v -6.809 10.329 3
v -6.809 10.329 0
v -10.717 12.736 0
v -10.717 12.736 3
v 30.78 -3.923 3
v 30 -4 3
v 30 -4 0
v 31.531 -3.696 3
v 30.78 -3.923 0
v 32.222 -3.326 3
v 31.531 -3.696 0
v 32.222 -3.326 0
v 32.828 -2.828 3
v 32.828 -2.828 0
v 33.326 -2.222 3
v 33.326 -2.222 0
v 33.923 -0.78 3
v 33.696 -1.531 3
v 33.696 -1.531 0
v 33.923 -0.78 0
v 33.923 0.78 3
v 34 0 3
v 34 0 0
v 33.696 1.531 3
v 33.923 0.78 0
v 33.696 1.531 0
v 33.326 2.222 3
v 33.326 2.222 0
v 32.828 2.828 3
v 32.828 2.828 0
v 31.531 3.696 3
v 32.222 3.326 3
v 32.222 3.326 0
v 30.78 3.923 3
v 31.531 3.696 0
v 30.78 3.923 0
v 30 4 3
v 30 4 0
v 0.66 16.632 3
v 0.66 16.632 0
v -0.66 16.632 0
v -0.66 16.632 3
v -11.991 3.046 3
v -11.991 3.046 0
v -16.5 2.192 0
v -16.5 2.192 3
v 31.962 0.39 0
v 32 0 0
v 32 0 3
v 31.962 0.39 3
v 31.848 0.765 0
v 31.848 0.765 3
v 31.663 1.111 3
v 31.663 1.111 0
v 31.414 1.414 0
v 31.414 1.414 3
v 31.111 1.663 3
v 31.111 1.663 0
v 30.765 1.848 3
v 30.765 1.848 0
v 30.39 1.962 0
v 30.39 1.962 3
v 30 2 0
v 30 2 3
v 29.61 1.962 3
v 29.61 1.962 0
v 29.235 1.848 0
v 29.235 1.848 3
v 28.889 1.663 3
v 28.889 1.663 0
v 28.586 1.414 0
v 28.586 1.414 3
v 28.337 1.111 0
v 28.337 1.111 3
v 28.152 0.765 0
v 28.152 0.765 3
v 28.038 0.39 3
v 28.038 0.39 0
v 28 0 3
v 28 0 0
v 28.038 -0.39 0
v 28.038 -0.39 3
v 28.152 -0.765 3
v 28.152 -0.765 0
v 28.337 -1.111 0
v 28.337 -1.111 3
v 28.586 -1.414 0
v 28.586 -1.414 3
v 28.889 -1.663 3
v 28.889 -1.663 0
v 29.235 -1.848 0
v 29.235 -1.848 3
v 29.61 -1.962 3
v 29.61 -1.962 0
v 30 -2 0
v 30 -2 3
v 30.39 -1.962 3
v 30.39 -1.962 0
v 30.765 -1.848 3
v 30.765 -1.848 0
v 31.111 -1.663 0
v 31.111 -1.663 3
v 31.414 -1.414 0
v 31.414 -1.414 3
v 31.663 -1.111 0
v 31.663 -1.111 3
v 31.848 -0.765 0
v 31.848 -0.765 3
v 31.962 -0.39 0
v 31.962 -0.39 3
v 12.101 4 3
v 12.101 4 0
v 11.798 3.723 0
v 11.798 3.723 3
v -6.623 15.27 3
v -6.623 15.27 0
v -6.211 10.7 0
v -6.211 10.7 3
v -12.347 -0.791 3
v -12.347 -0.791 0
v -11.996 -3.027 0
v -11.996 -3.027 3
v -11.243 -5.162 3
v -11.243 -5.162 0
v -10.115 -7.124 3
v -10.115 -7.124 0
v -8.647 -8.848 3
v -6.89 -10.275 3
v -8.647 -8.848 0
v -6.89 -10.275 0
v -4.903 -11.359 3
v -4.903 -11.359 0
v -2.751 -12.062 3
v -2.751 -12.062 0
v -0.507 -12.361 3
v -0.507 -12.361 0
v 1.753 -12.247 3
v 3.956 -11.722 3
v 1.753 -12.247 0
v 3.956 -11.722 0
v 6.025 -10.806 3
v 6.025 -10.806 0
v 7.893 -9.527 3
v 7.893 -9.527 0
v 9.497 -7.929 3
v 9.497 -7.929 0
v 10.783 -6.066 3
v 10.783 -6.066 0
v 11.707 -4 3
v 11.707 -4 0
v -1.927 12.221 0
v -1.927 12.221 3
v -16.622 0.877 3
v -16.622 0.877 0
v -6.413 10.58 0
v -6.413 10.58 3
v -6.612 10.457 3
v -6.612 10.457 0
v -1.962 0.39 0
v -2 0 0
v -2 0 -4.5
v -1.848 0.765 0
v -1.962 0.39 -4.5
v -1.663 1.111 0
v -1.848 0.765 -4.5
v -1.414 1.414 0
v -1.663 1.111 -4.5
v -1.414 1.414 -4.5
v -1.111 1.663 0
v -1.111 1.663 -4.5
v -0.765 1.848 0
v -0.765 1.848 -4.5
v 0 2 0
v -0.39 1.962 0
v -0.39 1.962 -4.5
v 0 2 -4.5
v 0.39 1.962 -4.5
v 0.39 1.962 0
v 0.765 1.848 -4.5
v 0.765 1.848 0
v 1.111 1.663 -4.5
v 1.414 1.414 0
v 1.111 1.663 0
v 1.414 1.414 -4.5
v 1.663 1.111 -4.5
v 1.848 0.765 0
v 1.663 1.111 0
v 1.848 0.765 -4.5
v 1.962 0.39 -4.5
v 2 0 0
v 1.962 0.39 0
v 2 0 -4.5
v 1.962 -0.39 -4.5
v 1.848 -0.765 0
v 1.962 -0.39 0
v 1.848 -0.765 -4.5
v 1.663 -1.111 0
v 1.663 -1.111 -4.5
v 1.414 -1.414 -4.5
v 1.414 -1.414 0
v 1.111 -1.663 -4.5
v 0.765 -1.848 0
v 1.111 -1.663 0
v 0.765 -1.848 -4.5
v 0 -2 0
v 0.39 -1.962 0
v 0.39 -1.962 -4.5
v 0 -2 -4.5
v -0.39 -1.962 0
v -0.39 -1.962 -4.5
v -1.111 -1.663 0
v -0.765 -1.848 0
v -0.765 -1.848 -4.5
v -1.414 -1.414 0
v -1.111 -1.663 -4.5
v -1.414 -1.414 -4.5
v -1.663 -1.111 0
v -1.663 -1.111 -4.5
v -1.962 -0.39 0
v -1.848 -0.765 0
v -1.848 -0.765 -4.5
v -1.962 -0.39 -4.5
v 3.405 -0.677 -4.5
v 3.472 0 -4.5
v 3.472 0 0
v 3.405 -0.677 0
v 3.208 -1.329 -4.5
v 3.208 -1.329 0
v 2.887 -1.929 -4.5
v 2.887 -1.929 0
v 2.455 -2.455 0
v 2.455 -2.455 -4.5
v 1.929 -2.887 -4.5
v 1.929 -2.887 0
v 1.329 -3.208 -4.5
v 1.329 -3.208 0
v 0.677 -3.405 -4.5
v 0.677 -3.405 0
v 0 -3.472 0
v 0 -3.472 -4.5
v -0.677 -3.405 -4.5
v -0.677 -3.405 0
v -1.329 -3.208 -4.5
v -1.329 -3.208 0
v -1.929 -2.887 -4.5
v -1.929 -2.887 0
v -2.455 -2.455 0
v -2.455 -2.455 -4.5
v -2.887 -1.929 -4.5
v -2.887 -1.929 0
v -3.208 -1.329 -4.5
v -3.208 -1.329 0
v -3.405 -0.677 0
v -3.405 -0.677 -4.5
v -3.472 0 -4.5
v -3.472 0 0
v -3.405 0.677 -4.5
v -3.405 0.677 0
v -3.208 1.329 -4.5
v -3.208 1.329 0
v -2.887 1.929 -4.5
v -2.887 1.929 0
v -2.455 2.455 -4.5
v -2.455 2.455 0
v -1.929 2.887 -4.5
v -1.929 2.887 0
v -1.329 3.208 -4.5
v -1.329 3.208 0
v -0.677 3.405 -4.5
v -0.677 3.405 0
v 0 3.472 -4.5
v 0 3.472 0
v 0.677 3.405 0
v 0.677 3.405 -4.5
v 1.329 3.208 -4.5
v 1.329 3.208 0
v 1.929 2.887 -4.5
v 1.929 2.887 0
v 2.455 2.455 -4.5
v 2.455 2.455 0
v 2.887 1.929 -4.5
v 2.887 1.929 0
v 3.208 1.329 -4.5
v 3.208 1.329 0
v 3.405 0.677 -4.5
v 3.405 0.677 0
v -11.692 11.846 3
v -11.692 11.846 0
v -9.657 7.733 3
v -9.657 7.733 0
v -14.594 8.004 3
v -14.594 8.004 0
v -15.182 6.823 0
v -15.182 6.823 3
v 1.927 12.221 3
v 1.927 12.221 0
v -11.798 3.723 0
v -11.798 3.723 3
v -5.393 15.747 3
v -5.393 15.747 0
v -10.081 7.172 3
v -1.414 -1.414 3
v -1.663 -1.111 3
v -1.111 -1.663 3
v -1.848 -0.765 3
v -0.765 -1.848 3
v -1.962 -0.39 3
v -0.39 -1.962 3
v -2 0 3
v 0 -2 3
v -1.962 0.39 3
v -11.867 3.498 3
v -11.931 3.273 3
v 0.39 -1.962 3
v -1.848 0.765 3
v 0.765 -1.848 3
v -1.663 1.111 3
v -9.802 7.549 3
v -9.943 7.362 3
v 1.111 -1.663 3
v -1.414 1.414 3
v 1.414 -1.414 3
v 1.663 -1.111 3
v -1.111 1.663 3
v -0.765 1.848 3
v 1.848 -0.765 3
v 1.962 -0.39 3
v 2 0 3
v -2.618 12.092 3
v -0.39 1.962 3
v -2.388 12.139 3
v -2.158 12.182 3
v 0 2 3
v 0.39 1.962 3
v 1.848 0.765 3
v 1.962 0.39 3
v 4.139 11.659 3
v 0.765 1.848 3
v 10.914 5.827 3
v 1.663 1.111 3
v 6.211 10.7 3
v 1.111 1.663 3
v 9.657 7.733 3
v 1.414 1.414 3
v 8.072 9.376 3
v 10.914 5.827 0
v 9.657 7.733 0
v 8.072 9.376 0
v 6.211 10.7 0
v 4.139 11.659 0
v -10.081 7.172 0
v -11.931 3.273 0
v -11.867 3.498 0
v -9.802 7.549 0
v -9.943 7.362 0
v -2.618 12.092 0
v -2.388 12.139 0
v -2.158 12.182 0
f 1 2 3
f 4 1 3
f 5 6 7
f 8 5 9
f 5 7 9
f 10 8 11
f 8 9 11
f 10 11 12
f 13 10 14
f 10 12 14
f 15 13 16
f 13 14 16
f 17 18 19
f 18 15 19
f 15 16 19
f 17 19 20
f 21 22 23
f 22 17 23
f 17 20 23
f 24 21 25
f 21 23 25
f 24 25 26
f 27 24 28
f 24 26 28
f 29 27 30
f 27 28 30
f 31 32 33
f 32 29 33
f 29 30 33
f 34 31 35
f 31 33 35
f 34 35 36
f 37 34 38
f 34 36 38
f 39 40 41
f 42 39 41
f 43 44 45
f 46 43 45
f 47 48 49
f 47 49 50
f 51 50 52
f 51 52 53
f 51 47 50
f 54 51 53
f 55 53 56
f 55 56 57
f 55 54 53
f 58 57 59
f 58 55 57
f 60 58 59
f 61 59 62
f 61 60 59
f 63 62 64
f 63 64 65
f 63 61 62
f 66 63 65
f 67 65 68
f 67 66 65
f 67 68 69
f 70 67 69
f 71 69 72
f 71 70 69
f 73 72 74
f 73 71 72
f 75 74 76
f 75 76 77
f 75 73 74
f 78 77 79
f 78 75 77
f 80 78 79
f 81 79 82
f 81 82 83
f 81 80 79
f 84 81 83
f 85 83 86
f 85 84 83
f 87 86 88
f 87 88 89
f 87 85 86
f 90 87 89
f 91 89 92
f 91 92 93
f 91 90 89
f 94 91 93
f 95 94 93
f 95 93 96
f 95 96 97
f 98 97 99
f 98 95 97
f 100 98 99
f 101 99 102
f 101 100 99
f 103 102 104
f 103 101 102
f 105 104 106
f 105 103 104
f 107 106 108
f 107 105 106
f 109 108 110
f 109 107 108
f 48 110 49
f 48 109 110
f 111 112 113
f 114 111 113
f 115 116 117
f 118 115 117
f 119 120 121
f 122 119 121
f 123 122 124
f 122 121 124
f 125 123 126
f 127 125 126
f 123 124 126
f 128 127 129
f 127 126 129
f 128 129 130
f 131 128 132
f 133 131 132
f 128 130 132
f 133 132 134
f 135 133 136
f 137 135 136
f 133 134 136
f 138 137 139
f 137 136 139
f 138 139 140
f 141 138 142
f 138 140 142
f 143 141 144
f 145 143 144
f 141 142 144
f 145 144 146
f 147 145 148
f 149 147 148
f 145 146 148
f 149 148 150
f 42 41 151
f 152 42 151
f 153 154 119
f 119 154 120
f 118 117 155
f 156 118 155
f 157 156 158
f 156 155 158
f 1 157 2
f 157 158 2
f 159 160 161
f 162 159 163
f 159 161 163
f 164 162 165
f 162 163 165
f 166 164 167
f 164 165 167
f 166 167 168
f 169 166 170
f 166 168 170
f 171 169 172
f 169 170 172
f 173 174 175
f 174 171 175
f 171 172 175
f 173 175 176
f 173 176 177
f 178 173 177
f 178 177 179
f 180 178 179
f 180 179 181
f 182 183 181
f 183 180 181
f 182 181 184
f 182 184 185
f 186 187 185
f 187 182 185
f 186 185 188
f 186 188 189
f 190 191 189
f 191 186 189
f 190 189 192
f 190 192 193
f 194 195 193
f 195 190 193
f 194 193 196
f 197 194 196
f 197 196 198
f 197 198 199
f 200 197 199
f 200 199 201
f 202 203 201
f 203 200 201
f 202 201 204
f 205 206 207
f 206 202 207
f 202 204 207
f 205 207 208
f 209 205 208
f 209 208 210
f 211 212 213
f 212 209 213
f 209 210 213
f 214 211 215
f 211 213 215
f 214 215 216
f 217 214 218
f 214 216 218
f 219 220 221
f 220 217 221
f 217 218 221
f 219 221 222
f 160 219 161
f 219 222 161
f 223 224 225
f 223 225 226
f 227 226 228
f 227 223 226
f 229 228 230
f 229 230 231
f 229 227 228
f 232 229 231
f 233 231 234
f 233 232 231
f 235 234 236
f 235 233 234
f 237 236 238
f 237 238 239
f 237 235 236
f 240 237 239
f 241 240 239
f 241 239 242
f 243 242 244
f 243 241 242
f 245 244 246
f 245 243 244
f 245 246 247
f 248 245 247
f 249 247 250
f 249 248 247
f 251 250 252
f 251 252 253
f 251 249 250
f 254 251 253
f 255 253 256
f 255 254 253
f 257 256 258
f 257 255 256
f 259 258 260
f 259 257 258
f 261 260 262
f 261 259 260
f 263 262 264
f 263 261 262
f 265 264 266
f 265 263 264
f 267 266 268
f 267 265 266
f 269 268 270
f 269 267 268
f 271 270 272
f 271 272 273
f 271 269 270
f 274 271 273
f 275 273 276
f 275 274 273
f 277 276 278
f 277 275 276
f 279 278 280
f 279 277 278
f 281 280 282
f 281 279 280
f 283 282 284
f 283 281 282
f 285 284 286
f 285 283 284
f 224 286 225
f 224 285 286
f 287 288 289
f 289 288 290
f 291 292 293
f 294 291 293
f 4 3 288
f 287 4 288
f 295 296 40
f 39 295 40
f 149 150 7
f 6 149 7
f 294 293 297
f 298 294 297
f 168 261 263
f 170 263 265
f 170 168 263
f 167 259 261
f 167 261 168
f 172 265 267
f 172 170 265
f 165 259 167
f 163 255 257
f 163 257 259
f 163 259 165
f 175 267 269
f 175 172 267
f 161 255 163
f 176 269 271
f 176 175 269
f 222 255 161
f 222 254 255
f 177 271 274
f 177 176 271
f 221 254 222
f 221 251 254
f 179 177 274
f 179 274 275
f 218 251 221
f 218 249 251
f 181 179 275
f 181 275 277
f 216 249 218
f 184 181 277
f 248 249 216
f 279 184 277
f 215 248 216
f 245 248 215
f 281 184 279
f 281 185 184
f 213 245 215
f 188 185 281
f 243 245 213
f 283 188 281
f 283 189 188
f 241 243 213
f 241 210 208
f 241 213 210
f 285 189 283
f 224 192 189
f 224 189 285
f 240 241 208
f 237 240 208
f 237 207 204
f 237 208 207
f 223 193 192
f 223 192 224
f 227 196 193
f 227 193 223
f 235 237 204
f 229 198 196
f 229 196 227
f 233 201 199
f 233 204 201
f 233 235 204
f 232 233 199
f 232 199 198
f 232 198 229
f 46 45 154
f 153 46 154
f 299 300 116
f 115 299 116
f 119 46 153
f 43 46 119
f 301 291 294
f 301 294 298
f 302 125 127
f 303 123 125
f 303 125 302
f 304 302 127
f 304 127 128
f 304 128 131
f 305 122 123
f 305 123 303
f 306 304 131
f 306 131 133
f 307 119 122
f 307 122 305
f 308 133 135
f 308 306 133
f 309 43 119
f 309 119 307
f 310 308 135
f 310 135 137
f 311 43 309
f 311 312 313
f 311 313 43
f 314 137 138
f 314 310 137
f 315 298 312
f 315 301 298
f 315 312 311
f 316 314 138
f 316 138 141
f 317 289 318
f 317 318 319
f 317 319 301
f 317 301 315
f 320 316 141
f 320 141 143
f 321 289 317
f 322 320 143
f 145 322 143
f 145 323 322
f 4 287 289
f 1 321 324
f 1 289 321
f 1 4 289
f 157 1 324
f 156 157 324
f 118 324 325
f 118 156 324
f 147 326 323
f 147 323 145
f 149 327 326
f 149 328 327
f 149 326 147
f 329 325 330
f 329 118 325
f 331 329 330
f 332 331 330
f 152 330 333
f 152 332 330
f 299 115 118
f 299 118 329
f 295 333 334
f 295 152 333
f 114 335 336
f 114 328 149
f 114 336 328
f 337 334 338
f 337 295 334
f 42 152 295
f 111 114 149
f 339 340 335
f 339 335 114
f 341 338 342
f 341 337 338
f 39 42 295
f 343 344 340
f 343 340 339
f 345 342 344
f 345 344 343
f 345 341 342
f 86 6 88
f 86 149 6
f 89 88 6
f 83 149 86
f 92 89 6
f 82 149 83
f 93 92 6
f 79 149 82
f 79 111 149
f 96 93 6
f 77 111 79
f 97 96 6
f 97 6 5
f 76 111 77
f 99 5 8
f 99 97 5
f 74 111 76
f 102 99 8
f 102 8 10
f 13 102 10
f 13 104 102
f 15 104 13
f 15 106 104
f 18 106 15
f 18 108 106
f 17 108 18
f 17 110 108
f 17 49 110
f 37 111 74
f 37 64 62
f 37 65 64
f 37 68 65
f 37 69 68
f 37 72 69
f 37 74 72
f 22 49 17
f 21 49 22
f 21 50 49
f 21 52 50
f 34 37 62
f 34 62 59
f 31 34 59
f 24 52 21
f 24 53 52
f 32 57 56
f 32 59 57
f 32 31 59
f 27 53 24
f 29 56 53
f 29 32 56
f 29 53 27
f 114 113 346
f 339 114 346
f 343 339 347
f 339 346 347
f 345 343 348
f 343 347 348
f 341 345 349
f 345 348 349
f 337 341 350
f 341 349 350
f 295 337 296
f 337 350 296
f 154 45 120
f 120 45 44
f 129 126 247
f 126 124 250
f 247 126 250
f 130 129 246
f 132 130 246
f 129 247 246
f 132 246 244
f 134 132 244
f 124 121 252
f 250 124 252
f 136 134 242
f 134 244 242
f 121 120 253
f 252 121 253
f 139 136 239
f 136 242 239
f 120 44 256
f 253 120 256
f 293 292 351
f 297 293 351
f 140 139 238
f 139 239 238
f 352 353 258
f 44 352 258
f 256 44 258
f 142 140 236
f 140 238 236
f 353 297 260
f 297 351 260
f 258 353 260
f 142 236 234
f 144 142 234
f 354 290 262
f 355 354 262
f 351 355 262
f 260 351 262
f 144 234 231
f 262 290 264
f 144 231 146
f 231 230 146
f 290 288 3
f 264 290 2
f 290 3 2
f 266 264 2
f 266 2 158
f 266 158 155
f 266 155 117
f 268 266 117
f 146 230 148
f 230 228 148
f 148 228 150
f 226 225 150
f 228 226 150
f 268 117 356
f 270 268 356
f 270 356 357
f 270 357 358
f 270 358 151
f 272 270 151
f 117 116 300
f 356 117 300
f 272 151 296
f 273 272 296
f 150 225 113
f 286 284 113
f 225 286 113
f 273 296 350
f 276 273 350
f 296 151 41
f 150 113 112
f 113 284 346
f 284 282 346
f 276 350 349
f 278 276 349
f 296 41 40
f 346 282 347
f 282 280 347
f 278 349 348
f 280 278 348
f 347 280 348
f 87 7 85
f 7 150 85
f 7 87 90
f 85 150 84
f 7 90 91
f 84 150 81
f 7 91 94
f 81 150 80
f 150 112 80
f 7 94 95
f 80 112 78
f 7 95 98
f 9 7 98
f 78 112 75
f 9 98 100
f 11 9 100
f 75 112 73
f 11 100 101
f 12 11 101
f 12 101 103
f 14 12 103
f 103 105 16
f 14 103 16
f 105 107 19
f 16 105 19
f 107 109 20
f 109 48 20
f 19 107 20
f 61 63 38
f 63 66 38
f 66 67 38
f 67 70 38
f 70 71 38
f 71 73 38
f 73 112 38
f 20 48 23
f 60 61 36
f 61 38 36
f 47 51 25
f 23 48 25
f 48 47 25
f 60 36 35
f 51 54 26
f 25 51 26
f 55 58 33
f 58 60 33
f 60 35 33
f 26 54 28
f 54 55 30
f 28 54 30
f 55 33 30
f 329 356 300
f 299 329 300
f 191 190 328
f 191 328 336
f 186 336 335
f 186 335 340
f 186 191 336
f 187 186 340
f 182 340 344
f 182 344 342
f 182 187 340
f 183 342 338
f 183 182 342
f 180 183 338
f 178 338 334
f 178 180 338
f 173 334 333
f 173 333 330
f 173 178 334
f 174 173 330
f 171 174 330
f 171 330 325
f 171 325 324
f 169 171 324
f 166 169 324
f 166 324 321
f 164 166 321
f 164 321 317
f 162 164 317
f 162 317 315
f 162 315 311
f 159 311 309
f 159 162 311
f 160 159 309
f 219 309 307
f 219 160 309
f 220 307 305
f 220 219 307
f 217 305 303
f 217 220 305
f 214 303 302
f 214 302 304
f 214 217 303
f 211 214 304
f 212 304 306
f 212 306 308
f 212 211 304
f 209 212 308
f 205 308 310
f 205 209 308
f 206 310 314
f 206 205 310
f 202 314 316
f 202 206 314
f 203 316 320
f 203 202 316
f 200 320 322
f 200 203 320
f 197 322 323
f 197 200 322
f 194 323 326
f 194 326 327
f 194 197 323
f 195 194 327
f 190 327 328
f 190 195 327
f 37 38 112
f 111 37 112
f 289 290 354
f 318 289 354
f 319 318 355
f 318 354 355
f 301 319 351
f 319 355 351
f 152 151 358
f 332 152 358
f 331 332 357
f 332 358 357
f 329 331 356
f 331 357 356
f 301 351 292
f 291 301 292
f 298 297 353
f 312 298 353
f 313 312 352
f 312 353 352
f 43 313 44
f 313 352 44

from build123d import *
from build123d.topology import SkipClean

# Parameters (mm, degrees)
SKETCH_1_R      = 12.371827661
SKETCH_1_R_2    = 2
SKETCH_1_R_3    = 4
EXTRUDE_2_DEPTH = 3
EXTRUDE_START   = 4.5
SKETCH_2_R      = 3.472144909
SKETCH_2_R_2    = 2
EXTRUDE_5_DEPTH = 4.5


with BuildPart() as part:
    # ｽｹｯﾁ1 → ﾎﾞｽ - 押し出し2 (new body)
    # profile 1 of 10: a face of its own
    with BuildSketch(Plane.XY):
        with BuildLine():
            ThreePointArc((-12.346524216, -0.790859961), (-12.319051626, 1.141528242), (-11.990981042, 3.046061939))
            Line((-11.990981042, 3.046061939), (-16.499913731, 2.191691895))
            Line((-16.499913731, 2.191691895), (-16.621693674, 0.877477017))
            Line((-16.621693674, 0.877477017), (-12.346524216, -0.790859961))
        make_face()
    # profile 2 of 10: a face of its own
    with BuildSketch(Plane.XY):
        with BuildLine():
            ThreePointArc((-11.798482531, 3.722624028), (-11.074805969, 5.51459812), (-10.080892335, 7.172010138))
            Line((-10.080892335, 7.172010138), (-14.59398091, 8.004148156))
            Line((-14.59398091, 8.004148156), (-15.182286497, 6.822671267))
            Line((-15.182286497, 6.822671267), (-11.798482531, 3.722624028))
        make_face()
    # profile 3 of 10: a face of its own
    with BuildSketch(Plane.XY):
        with BuildLine():
            ThreePointArc((-9.656990403, 7.733347015), (-8.334846399, 9.142890964), (-6.809323258, 10.329338626))
            Line((-6.809323258, 10.329338626), (-10.717050099, 12.735599855))
            Line((-10.717050099, 12.735599855), (-11.692427401, 11.846425958))
            Line((-11.692427401, 11.846425958), (-9.656990403, 7.733347015))
        make_face()
    # profile 4 of 10: a face of its own
    with BuildSketch(Plane.XY):
        with BuildLine():
            ThreePointArc((-6.211268209, 10.699638635), (-4.469219638, 11.536385721), (-2.618117343, 12.091632696))
            Line((-2.618117343, 12.091632696), (-5.392722287, 15.747038224))
            Line((-5.392722287, 15.747038224), (-6.623441194, 15.27025518))
            Line((-6.623441194, 15.27025518), (-6.211268209, 10.699638635))
        make_face()
    # profile 5 of 10: a face of its own
    with BuildSketch(Plane.XY):
        with BuildLine():
            Line((0.659922552, 16.631751824), (-0.659922552, 16.631751824))
            Line((-0.659922552, 16.631751824), (-1.926679827, 12.220884769))
            ThreePointArc((-1.926679827, 12.220884769), (0, 12.371827661), (1.926679827, 12.220884769))
            Line((1.926679827, 12.220884769), (0.659922552, 16.631751824))
        make_face()
    # profile 6 of 10: a face of its own
    with BuildSketch(Plane.XY):
        with BuildLine():
            Line((12.101247567, 4), (11.798482531, 3.722624028))
            ThreePointArc((11.798482531, 3.722624028), (11.899541098, 3.38571135), (11.990981042, 3.046061939))
            Line((11.990981042, 3.046061939), (16.499913731, 2.191691895))
            Line((16.499913731, 2.191691895), (16.621693674, 0.877477017))
            Line((16.621693674, 0.877477017), (12.346524216, -0.790859961))
            ThreePointArc((12.346524216, -0.790859961), (12.319051626, -1.141528242), (12.281621315, -1.491273804))
            Line((12.281621315, -1.491273804), (16.177441774, -3.916764501))
            Line((16.177441774, -3.916764501), (16.153759232, -4))
            Line((16.153759232, -4), (30, -4))
            ThreePointArc((30, -4), (26, 0), (30, 4))
            Line((30, 4), (12.101247567, 4))
        make_face()
    # profile 7 of 10: a face of its own
    with BuildSketch(Plane.XY):
        with BuildLine():
            Line((16.499913731, 2.191691895), (11.990981042, 3.046061939))
            ThreePointArc((11.990981042, 3.046061939), (12.276246793, 1.534889042), (12.371827661, 0))
            ThreePointArc((12.371827661, 0), (12.365500182, -0.395632324), (12.346524216, -0.790859961))
            Line((12.346524216, -0.790859961), (16.621693674, 0.877477017))
            Line((16.621693674, 0.877477017), (16.499913731, 2.191691895))
        make_face()
    # profile 8 of 10: a face of its own
    with BuildSketch(Plane.XY):
        Circle(SKETCH_1_R)
        Circle(SKETCH_1_R_2, mode=Mode.SUBTRACT)
    # profile 9 of 10: a face of its own
    with BuildSketch(Plane.XY):
        with BuildLine():
            Line((11.707353231, -4), (16.153759232, -4))
            Line((16.153759232, -4), (16.177441774, -3.916764501))
            Line((16.177441774, -3.916764501), (12.281621315, -1.491273804))
            ThreePointArc((12.281621315, -1.491273804), (12.059898496, -2.760610069), (11.707353231, -4))
        make_face()
    # profile 10 of 10: a face of its own
    with BuildSketch(Plane.XY):
        with Locations((30, 0)):
            Circle(SKETCH_1_R_3)
        with Locations((30, 0)):
            Circle(SKETCH_1_R_2, mode=Mode.SUBTRACT)
    extrude(amount=EXTRUDE_2_DEPTH)

    # ｽｹｯﾁ2 → ﾎﾞｽ - 押し出し5 (add)
    with SkipClean():  # the faces are left unmerged after this step: merging them gives an invalid solid
        with BuildSketch(Plane(origin=(0, 0, 0), x_dir=(-1, 0, 0), z_dir=(0, 0, -1)).offset(EXTRUDE_START)):
            with Locations(Location((0, 0, 0), (0, 0, 180))):
                Circle(SKETCH_2_R)
            Circle(SKETCH_2_R_2, mode=Mode.SUBTRACT)
        extrude(amount=-EXTRUDE_5_DEPTH)


solid = part.part
